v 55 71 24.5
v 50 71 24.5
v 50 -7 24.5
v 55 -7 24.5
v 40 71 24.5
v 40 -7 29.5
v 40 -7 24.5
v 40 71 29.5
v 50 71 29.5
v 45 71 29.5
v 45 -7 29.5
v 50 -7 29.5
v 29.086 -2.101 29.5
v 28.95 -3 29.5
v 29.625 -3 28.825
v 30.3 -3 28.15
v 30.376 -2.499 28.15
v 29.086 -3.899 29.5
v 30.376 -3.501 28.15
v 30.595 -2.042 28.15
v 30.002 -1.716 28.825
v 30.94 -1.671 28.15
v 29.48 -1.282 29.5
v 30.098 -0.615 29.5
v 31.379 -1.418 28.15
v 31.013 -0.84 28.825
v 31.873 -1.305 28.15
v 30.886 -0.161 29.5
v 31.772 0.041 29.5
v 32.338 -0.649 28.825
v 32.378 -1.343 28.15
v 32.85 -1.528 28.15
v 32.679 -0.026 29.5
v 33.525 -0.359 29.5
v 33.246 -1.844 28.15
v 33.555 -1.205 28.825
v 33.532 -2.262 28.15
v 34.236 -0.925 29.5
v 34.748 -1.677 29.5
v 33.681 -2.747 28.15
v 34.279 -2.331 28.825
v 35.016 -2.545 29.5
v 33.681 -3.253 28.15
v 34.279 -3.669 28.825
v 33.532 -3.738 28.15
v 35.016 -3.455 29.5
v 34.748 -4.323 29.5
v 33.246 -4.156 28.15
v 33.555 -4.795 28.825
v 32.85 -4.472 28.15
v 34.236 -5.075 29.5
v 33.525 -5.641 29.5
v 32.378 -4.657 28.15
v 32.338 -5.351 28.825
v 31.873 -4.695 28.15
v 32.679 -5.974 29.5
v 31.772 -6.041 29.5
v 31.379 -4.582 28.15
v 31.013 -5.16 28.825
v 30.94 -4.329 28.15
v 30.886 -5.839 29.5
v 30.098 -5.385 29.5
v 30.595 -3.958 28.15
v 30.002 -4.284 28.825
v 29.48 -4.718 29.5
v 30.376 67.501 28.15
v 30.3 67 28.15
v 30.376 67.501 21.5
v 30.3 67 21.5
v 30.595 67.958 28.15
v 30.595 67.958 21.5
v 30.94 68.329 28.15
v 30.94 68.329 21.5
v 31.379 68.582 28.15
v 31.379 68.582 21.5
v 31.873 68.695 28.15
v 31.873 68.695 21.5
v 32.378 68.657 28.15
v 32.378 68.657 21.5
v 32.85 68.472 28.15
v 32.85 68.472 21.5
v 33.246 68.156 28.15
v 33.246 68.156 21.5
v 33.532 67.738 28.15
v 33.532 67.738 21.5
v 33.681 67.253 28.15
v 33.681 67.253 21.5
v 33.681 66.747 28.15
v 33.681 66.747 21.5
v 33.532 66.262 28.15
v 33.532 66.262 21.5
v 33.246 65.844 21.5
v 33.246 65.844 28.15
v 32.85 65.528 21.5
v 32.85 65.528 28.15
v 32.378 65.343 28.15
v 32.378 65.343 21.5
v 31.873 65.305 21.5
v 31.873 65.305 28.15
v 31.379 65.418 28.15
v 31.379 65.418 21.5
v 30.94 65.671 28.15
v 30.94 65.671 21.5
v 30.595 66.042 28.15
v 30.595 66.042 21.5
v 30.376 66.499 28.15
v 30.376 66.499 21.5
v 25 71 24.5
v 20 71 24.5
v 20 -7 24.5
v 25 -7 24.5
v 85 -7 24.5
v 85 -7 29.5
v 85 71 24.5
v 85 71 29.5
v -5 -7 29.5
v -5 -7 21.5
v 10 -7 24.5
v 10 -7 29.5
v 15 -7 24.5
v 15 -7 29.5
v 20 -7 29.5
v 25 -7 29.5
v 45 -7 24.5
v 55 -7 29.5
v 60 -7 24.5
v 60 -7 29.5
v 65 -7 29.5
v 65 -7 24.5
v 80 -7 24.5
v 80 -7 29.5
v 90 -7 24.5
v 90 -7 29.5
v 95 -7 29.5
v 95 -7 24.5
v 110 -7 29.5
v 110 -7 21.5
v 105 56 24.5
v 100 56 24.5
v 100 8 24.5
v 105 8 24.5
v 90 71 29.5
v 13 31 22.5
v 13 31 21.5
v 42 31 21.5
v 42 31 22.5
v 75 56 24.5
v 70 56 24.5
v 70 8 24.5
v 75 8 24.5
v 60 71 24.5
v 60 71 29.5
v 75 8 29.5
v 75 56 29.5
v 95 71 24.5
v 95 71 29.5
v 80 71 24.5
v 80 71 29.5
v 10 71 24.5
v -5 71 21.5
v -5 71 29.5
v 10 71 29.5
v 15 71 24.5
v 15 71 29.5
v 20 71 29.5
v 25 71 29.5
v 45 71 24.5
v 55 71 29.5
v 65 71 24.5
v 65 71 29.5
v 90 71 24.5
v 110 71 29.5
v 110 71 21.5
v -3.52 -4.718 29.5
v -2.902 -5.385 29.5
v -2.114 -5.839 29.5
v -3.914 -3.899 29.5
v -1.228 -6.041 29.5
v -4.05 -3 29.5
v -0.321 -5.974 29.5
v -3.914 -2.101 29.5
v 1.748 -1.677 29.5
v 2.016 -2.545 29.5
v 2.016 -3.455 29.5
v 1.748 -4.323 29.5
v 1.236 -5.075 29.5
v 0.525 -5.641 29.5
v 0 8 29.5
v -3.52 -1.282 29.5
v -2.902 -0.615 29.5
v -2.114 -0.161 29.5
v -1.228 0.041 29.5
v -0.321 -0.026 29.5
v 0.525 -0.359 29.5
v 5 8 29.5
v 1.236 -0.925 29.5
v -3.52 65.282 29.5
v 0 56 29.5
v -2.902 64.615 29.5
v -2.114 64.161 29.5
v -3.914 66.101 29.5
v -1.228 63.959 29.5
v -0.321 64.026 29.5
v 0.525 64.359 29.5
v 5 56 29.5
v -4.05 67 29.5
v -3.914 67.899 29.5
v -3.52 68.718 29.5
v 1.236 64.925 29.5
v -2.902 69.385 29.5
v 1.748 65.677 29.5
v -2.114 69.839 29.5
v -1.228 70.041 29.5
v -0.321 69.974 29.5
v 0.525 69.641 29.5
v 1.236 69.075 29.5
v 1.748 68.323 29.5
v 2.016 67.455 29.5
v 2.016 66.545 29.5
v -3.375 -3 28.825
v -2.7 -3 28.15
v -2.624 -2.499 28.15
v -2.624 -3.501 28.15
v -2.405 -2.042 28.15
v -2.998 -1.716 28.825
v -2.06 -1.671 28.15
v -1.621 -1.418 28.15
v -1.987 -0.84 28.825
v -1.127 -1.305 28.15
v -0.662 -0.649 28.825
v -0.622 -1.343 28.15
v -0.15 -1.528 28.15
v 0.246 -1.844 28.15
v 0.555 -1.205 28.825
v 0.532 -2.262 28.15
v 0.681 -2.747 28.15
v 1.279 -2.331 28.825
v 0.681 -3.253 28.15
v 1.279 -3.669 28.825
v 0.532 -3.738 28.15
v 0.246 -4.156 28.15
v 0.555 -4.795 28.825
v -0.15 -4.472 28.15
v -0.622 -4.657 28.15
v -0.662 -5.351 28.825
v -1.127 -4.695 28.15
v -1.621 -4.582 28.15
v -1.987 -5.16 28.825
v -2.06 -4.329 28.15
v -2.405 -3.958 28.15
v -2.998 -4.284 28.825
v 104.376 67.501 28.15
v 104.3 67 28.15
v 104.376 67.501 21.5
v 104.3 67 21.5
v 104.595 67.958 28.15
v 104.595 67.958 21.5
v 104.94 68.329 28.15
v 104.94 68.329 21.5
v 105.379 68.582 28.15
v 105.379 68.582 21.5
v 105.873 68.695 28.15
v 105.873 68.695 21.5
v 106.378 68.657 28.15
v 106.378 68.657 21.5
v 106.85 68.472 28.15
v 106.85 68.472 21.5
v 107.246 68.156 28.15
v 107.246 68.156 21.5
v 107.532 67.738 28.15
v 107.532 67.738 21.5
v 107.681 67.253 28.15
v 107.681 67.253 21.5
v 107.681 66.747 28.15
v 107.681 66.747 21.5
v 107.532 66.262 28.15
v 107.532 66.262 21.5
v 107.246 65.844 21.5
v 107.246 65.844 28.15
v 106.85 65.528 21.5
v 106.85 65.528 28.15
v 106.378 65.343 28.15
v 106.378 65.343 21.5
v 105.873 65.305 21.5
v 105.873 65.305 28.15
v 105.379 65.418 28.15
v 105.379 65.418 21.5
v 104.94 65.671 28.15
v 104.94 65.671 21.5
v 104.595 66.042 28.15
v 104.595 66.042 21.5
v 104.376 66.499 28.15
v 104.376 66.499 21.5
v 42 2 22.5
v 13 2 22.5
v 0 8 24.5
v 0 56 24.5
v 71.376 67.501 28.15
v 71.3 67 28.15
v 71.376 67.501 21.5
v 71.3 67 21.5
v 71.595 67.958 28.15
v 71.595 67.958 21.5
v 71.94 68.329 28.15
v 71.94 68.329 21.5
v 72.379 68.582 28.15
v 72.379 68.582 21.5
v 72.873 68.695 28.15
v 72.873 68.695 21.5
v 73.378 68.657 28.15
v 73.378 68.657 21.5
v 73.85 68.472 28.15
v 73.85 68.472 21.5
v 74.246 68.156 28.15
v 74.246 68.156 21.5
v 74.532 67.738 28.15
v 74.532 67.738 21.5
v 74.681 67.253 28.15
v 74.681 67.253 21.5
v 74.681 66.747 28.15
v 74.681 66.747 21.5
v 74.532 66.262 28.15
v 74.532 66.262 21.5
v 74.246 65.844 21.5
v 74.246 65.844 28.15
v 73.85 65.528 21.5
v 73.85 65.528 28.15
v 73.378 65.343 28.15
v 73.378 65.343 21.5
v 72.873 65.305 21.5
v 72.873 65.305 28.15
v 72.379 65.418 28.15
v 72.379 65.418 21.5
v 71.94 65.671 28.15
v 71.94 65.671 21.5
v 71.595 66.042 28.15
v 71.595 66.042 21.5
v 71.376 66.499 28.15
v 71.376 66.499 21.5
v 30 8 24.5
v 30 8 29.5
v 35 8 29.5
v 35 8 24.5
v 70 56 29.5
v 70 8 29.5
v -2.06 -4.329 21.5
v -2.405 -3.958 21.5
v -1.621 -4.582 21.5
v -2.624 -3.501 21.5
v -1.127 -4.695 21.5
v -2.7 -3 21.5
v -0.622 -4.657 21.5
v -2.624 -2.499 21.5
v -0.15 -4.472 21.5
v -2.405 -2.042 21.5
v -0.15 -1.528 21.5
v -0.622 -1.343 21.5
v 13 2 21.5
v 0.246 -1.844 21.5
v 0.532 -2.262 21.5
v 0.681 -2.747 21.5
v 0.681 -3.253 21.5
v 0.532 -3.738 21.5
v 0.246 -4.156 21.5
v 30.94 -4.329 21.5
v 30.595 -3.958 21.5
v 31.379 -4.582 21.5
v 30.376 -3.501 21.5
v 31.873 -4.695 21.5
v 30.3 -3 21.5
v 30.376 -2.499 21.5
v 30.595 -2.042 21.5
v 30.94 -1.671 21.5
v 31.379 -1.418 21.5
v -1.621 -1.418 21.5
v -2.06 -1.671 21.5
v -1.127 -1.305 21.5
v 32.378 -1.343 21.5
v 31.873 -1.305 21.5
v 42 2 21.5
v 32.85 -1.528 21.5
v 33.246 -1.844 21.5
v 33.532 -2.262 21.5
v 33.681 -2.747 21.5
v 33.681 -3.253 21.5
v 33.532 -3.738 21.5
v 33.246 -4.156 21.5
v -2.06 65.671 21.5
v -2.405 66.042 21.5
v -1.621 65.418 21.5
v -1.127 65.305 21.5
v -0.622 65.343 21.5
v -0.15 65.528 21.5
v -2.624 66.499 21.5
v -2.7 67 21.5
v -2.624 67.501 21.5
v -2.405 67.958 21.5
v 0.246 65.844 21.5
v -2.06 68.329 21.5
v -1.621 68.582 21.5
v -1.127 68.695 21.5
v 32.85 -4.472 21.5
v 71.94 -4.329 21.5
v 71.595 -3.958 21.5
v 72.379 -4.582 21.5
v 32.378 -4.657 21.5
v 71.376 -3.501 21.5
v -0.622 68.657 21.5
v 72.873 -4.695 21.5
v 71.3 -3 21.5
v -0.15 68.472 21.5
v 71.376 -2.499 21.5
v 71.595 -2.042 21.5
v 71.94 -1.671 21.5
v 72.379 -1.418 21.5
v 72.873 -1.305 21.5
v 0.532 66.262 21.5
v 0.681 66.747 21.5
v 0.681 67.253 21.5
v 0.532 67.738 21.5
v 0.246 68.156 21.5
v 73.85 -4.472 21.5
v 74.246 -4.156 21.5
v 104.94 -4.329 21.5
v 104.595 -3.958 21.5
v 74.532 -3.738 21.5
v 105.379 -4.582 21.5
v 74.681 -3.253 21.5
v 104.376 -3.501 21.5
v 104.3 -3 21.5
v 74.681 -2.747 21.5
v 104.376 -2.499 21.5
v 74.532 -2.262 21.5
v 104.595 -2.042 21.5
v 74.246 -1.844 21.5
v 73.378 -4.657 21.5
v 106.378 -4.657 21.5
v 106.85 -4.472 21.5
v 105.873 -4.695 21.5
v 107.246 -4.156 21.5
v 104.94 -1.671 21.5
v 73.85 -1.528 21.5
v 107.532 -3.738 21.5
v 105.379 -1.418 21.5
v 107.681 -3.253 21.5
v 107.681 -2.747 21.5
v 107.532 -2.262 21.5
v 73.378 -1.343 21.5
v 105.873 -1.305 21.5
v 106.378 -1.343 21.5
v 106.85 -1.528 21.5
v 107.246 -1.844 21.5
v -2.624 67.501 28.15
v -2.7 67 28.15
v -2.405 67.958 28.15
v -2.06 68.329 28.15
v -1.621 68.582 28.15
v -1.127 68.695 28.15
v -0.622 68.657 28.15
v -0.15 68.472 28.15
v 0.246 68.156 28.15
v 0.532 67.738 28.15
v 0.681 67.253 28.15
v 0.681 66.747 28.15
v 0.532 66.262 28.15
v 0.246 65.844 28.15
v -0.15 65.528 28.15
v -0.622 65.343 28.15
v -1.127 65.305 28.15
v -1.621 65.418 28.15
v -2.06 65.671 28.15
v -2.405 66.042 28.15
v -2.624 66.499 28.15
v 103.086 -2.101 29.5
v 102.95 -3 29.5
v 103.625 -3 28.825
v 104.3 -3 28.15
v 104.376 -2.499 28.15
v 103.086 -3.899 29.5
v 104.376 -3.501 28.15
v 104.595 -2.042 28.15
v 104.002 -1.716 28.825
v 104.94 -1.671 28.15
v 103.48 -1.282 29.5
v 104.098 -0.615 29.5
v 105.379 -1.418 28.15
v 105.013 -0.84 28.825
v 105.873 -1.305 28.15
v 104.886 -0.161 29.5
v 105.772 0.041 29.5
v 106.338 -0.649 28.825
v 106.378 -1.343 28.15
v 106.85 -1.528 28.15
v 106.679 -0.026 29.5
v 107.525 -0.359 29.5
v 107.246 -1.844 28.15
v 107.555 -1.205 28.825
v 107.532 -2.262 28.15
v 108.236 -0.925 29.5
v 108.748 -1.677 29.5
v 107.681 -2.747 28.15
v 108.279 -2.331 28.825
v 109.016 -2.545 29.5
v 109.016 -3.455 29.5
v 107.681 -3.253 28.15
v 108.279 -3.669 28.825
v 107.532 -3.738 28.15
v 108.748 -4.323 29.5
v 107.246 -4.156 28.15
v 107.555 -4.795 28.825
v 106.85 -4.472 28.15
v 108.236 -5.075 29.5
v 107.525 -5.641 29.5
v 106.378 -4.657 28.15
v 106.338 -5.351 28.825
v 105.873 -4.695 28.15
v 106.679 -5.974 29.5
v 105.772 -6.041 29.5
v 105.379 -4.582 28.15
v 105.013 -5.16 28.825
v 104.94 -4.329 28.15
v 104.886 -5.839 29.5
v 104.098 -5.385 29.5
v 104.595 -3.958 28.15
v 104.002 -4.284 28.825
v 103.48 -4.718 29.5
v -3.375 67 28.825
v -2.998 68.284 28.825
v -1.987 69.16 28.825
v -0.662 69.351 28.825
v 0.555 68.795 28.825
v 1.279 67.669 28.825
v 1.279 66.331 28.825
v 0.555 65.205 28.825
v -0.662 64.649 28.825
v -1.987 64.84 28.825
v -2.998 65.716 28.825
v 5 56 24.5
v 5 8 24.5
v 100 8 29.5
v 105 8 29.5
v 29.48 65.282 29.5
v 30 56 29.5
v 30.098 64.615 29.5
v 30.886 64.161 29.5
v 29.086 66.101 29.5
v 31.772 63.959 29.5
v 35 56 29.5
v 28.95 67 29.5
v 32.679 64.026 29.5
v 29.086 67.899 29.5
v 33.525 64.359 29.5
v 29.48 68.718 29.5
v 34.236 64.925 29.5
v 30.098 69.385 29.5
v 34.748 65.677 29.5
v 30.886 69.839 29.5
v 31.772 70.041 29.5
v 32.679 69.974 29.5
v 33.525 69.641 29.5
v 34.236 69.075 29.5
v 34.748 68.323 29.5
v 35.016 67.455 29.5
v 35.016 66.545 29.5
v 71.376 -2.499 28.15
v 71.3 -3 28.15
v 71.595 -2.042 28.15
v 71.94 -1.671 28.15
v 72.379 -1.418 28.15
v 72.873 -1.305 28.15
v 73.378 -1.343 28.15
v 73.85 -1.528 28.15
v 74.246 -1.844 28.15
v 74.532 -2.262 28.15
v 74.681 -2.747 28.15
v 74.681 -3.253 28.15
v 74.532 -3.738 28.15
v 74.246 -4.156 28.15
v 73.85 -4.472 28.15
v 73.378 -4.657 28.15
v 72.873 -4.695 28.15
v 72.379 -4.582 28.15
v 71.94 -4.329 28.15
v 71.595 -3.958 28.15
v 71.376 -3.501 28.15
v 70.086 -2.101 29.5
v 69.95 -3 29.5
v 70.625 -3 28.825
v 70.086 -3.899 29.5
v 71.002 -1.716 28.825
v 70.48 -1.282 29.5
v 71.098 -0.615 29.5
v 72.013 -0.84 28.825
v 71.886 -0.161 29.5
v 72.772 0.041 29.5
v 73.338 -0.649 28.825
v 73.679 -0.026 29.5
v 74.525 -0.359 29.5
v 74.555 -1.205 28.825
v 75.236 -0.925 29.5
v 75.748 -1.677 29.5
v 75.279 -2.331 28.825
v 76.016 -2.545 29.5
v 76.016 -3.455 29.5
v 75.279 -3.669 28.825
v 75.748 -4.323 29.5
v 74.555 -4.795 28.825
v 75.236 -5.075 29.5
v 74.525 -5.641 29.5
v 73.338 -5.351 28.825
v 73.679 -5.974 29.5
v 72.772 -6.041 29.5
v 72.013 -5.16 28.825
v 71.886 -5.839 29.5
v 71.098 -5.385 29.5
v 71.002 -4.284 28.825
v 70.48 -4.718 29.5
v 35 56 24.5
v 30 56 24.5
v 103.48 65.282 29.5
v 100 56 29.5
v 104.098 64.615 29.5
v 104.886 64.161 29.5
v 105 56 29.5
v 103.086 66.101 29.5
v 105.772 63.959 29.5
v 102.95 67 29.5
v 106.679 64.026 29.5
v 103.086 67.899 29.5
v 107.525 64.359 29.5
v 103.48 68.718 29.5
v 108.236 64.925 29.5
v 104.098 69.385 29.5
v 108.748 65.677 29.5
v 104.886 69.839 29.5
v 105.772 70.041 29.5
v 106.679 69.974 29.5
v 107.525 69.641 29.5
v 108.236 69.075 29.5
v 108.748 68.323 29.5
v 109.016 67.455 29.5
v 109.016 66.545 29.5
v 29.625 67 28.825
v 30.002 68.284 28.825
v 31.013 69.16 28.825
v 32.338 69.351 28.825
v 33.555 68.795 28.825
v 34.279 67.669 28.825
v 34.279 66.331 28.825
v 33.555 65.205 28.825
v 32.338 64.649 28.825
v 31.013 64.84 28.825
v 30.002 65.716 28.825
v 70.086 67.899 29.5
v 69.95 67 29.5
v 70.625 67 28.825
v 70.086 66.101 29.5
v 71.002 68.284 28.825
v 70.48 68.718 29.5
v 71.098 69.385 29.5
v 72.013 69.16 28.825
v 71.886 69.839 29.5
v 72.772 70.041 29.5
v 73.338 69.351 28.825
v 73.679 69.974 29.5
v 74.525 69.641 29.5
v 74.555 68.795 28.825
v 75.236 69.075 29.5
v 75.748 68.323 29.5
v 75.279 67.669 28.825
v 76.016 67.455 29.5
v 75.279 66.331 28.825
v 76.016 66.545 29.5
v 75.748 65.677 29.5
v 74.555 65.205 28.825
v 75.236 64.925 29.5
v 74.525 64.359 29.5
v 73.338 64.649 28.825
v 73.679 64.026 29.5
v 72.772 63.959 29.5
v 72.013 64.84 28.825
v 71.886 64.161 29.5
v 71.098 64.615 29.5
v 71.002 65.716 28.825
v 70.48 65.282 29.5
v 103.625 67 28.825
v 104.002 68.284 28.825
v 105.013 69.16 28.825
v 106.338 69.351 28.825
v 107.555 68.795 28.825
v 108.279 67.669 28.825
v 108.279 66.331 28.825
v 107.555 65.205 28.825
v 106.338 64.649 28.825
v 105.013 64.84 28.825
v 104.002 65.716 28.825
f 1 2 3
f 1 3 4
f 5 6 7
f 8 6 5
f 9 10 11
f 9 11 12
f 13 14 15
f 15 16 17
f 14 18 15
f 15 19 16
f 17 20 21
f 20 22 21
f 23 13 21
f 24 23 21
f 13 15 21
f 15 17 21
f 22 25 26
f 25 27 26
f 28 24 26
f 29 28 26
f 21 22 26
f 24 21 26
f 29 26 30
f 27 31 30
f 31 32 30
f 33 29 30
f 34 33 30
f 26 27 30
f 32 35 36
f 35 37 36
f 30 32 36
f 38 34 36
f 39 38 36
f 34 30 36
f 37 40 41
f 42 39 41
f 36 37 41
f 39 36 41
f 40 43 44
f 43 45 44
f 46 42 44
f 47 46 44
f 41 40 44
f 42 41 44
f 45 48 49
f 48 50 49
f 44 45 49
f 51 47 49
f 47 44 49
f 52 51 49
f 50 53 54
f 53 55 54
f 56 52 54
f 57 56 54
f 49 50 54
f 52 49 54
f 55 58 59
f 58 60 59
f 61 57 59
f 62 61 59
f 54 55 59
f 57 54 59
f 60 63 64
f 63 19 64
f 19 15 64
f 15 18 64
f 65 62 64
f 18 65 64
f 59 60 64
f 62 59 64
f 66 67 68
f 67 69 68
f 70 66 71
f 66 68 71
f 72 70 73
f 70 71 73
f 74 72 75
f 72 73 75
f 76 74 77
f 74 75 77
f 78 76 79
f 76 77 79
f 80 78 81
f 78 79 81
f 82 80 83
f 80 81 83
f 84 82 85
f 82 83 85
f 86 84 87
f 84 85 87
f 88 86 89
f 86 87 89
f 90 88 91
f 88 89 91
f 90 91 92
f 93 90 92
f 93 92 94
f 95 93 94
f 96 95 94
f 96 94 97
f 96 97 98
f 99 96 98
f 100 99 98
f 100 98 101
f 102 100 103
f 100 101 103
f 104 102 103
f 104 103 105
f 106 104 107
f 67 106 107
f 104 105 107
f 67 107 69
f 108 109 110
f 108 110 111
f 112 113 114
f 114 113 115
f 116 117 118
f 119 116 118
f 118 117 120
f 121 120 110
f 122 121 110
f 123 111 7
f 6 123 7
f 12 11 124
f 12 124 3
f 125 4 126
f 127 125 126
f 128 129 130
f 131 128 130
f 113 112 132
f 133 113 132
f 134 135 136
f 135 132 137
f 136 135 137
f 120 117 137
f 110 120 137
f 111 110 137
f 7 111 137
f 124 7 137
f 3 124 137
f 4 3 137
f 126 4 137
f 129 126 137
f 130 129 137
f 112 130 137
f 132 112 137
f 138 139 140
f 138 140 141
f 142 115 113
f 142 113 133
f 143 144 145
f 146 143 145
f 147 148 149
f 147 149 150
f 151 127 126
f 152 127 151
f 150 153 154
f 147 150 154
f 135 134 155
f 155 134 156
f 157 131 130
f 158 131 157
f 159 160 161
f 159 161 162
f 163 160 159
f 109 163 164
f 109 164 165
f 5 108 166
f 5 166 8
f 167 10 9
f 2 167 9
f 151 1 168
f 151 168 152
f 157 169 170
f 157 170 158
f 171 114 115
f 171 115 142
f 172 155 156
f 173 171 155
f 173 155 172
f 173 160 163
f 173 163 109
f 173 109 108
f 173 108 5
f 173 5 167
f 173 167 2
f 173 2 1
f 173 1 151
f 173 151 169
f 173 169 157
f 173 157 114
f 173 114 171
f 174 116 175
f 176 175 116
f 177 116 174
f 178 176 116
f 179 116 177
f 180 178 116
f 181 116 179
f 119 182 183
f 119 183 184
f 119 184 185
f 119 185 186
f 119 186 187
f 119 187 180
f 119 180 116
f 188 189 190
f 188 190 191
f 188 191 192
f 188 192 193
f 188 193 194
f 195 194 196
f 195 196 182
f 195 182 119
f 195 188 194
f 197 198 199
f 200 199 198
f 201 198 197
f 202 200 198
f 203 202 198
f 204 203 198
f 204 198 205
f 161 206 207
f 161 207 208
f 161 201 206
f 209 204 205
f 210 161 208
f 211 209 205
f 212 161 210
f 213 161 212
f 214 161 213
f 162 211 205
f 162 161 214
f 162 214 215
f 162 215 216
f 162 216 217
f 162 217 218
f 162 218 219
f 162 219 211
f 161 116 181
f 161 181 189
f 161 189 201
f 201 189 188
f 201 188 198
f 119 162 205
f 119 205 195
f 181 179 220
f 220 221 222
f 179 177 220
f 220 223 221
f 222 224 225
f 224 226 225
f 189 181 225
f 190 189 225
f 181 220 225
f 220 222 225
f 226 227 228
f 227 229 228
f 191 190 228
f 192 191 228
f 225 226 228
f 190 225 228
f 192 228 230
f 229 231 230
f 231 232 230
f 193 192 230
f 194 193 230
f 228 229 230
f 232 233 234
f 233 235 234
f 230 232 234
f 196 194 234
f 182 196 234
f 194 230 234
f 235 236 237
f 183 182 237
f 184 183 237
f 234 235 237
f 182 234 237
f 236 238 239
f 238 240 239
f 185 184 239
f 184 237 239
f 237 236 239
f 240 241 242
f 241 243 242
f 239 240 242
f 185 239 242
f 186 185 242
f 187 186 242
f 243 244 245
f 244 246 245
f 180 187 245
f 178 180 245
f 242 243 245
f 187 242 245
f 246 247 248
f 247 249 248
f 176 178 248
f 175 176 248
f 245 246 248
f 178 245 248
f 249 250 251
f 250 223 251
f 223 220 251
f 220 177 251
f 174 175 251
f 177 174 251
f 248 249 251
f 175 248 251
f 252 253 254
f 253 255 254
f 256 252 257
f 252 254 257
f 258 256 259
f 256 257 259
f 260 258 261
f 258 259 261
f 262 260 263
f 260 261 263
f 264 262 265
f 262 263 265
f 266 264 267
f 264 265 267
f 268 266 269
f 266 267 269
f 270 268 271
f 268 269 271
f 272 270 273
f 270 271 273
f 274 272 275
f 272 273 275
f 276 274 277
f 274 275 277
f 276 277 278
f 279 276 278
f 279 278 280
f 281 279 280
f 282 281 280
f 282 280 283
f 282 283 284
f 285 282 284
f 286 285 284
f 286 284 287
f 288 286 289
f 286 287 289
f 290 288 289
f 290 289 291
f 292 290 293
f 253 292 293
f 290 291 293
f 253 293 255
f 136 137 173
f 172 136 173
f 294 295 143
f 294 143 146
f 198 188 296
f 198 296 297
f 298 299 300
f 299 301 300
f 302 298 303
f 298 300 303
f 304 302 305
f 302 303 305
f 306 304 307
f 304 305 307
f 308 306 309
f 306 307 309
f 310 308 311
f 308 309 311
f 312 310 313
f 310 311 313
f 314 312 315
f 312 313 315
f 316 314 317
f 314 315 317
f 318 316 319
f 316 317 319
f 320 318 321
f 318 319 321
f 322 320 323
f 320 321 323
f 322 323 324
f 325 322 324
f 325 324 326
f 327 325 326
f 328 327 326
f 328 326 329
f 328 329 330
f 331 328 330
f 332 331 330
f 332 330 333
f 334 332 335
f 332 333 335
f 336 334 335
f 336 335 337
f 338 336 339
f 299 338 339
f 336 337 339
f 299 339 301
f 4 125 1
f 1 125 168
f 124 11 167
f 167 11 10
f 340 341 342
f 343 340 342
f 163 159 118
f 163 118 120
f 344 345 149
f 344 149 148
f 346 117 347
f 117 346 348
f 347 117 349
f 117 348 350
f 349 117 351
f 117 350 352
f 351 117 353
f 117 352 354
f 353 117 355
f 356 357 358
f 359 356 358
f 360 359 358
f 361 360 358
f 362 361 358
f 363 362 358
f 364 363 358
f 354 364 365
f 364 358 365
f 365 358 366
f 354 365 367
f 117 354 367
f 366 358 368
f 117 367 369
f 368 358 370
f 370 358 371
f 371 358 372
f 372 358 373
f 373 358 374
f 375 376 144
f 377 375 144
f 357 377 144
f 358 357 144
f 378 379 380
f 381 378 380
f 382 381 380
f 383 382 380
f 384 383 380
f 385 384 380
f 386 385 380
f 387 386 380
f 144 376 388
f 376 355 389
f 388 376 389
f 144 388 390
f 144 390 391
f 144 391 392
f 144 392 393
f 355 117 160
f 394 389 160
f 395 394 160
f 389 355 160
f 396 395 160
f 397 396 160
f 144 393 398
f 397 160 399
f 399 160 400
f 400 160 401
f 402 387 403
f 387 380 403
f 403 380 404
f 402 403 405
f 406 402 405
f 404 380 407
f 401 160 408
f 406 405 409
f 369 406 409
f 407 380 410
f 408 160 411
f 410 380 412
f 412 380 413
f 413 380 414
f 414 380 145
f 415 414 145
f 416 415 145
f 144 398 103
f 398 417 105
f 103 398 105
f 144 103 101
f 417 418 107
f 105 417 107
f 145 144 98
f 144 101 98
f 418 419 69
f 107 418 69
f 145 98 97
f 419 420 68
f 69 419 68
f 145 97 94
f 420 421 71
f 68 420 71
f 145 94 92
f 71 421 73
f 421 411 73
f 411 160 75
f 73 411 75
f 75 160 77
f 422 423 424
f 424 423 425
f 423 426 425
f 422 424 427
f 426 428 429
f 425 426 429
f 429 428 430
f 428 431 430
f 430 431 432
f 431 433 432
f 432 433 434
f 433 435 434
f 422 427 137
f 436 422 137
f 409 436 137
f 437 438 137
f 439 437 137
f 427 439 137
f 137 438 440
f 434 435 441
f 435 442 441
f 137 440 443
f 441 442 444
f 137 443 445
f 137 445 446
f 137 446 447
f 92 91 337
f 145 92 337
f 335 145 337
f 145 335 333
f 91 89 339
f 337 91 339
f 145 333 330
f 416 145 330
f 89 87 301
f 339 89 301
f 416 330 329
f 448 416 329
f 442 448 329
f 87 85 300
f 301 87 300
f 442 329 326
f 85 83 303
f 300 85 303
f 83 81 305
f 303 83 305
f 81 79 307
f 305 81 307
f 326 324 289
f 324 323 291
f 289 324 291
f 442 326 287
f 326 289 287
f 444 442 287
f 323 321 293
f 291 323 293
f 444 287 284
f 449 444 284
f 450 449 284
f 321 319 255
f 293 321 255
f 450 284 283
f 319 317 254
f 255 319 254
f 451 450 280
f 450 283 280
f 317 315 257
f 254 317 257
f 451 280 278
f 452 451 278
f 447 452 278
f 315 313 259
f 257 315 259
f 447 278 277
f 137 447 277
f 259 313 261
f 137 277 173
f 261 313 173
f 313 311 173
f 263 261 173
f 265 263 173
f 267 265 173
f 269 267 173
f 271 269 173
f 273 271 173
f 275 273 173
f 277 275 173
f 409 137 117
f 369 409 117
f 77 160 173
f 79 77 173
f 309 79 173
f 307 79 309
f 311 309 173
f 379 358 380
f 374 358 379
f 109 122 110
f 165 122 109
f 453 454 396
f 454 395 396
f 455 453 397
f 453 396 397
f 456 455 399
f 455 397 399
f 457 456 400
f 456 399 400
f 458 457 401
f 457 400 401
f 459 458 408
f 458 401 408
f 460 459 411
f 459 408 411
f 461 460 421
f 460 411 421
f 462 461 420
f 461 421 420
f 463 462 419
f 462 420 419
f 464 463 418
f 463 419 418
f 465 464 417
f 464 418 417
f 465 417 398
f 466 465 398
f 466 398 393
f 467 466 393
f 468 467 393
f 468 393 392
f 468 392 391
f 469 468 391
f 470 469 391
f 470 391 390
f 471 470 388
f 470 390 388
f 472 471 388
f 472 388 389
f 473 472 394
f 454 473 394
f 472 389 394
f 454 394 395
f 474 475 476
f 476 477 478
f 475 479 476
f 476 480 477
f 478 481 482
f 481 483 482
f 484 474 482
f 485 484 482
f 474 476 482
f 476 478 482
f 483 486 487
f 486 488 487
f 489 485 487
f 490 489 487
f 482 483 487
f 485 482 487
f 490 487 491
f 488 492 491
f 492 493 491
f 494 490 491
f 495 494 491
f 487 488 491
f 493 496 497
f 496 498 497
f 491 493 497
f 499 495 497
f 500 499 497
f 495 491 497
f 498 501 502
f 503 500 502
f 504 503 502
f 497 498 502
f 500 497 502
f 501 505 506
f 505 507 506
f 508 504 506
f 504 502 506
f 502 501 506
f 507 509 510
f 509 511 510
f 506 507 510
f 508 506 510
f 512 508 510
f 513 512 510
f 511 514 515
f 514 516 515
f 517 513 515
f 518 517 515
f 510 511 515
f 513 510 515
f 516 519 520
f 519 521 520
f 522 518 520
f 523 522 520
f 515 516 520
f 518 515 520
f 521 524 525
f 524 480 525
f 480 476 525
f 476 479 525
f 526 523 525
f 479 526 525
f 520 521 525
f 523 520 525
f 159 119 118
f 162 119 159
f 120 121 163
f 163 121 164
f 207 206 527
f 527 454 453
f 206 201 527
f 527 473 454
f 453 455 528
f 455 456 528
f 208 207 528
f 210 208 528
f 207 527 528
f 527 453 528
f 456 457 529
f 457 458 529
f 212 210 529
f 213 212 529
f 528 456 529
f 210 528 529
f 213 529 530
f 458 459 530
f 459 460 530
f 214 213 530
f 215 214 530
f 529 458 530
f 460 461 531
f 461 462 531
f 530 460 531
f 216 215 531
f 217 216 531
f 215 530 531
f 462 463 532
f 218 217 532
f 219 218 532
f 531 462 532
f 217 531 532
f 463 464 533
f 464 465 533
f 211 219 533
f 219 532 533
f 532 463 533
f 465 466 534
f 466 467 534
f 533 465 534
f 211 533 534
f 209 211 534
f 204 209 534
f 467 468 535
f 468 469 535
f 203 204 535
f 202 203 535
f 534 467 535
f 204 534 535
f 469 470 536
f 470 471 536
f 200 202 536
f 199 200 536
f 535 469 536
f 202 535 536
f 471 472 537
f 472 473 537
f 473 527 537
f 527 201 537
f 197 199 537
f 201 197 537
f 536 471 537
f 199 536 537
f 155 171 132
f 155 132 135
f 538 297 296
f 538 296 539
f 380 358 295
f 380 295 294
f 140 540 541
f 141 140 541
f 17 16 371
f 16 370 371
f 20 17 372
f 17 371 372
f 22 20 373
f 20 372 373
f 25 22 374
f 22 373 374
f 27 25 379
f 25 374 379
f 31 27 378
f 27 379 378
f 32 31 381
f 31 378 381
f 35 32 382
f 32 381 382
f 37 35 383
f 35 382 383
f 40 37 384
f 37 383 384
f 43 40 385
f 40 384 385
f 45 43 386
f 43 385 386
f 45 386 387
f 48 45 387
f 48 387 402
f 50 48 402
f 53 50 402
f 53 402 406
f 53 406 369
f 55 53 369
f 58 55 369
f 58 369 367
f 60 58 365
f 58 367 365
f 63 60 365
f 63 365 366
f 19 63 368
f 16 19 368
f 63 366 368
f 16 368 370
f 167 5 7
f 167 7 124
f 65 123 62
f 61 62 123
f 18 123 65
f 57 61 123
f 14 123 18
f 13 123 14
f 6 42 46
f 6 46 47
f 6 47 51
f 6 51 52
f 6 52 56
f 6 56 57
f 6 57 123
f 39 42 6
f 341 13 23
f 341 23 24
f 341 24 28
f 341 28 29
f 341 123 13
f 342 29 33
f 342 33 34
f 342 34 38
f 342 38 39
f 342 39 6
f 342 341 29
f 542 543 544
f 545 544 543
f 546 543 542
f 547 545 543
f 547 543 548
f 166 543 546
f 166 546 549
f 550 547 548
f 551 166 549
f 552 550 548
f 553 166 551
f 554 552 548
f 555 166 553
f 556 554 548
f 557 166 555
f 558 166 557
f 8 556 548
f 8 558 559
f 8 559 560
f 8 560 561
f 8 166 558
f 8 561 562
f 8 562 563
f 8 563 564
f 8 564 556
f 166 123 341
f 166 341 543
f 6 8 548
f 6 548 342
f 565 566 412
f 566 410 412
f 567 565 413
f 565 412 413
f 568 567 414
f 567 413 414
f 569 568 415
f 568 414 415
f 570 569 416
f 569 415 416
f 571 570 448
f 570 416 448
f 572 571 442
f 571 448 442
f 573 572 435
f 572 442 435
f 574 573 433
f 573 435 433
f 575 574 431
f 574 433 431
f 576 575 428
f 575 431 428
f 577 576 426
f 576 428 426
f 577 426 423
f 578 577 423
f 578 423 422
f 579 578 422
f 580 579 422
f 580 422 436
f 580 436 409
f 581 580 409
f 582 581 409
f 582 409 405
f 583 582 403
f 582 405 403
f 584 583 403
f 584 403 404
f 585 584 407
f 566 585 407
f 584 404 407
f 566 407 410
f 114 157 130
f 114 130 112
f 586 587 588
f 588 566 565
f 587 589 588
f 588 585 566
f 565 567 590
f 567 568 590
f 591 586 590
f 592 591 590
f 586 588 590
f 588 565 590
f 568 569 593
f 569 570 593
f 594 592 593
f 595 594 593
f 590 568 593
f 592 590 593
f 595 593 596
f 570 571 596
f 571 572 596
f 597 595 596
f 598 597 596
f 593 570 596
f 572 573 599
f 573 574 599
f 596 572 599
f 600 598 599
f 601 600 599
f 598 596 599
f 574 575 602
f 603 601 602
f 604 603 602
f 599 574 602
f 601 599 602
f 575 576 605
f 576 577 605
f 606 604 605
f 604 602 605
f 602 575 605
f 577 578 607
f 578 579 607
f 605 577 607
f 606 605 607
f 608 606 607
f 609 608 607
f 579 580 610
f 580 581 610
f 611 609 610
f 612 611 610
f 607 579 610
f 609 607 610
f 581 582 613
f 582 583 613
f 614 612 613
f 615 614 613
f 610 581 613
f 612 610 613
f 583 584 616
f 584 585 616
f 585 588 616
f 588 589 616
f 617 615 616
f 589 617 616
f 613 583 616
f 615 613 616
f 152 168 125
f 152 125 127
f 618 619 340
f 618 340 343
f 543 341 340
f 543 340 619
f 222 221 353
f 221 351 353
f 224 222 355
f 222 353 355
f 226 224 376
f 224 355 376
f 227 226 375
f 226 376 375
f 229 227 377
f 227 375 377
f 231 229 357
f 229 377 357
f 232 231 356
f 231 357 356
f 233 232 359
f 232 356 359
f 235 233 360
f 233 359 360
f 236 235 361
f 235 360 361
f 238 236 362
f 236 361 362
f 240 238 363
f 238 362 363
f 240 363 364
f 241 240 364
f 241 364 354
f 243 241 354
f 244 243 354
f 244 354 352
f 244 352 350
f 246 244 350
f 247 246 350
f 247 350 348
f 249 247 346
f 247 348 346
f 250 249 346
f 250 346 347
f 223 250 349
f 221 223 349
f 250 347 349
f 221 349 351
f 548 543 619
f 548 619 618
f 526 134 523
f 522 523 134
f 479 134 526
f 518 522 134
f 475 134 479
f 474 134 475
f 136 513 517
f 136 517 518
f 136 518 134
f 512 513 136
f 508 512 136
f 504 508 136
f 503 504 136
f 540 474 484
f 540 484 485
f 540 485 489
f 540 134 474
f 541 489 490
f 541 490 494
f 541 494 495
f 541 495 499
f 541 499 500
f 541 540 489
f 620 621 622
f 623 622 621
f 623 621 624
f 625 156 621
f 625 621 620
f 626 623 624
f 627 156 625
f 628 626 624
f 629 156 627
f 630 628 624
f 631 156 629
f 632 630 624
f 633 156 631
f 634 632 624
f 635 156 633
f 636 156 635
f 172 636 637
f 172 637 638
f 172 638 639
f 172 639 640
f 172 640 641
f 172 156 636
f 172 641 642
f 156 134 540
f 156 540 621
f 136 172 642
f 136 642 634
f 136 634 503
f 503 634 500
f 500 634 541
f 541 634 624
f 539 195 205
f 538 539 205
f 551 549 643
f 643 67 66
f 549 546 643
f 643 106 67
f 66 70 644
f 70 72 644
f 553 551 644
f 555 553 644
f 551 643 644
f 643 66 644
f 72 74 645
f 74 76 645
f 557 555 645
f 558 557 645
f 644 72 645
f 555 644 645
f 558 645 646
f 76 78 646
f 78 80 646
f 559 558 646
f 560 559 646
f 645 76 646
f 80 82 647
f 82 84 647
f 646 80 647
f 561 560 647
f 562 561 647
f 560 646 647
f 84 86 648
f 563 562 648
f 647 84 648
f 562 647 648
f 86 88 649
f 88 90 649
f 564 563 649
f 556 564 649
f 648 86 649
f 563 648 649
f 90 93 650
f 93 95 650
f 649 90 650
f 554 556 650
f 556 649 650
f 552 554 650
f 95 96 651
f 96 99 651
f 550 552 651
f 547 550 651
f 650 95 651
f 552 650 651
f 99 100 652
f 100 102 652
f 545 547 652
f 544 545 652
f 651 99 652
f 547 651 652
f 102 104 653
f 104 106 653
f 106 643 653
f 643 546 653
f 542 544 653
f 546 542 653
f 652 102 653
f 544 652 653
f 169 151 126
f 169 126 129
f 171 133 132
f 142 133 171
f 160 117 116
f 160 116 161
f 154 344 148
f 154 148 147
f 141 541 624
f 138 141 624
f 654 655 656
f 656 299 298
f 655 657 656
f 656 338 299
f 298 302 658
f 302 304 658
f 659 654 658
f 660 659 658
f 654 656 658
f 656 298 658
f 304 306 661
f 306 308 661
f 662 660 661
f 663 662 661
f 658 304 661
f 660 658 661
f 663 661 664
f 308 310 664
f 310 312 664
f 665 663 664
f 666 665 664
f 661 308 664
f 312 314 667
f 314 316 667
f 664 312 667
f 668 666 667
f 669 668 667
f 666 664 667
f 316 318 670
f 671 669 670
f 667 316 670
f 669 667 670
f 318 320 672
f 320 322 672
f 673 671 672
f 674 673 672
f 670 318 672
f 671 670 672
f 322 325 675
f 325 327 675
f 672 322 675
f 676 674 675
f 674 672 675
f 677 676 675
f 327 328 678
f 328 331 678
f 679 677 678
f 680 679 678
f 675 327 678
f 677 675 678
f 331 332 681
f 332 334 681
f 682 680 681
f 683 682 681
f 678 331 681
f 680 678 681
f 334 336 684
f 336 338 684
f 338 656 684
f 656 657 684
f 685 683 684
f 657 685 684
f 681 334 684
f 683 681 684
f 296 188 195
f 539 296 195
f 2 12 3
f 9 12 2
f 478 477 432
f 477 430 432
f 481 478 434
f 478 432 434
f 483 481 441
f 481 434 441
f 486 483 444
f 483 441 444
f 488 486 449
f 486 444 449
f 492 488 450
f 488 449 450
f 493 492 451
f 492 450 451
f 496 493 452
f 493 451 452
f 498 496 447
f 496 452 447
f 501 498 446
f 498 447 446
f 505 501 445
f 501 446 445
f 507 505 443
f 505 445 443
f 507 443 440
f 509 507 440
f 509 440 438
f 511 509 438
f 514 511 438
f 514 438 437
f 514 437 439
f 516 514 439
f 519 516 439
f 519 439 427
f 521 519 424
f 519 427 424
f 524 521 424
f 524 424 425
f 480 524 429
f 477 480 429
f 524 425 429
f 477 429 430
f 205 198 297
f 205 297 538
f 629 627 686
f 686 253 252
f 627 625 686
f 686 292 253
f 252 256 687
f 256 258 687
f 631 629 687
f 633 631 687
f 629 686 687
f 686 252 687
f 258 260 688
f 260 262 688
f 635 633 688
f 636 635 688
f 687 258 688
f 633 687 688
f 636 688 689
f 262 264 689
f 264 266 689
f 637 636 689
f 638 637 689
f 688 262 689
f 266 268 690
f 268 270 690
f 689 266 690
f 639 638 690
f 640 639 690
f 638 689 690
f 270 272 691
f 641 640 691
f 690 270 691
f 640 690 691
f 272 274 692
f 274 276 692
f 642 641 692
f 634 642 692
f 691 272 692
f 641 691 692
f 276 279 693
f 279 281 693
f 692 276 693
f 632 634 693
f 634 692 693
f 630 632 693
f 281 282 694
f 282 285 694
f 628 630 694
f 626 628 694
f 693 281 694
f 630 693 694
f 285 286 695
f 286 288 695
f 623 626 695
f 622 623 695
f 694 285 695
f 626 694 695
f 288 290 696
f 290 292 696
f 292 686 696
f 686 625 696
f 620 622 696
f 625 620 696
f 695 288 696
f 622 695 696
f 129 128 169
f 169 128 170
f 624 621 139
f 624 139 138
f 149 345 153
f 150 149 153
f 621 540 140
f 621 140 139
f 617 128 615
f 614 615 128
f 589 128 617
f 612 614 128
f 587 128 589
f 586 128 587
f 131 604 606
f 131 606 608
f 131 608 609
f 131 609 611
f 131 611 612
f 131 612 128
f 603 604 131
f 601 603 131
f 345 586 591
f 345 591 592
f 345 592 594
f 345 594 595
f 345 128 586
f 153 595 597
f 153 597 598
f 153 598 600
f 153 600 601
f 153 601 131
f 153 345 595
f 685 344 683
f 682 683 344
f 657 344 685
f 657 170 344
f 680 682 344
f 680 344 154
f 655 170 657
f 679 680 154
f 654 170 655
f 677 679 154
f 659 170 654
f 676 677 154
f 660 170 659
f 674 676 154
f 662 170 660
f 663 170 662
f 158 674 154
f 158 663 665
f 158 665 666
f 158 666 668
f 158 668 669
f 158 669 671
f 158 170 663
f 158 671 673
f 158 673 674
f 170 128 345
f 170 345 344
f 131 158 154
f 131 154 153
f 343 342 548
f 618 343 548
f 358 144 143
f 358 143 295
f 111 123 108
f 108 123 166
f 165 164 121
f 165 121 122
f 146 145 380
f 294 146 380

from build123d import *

# Parameters (mm, degrees)
SKETCH022_W         = 115
SKETCH022_H         = 78
PAD010_DEPTH        = 8
HOLE002_D           = 3.4
HOLE002_DEPTH       = 8
HOLE002_CSINK_D     = 6.1
HOLE002_CSINK_ANGLE = 90
HOLE002_TIPS_R      = 1.7
SKETCH027_W         = 29
SKETCH027_H         = 29
POCKET009_DEPTH     = 1
SKETCH032_W         = 5
SKETCH032_H         = 48
SKETCH032_H_2       = 78
POCKET012_DEPTH     = 5


with BuildPart() as part:
    # Sketch022 (on Face1 of CopyPad011) → Pad010 (new body)
    with BuildSketch(Plane.XY.offset(24)):
        with Locations((52.5, 32)):
            Rectangle(SKETCH022_W, SKETCH022_H)
    extrude(amount=PAD010_DEPTH)

    # Hole002
    with Locations(Plane.XY.offset(32)):
        with Locations((-1, 67), (106, 67), (106, -3), (-1, -3), (32, 67), (73, -3), (32, -3), (73, 67)):
            CounterSinkHole(HOLE002_D / 2, HOLE002_CSINK_D / 2, depth=HOLE002_DEPTH, counter_sink_angle=HOLE002_CSINK_ANGLE)

    # Hole002 tips → Hole002 tip 1 section 0
    with BuildSketch(Plane.XY.offset(24), mode=Mode.PRIVATE) as hole002_tip_1_s0:
        with Locations((-1, 67)):
            Circle(HOLE002_TIPS_R)
    loft([hole002_tip_1_s0.sketch, Vertex(-1, 67, 22.978537)], mode=Mode.SUBTRACT)

    # Hole002 tips → Hole002 tip 2 section 0
    with BuildSketch(Plane.XY.offset(24), mode=Mode.PRIVATE) as hole002_tip_2_s0:
        with Locations((106, 67)):
            Circle(HOLE002_TIPS_R)
    loft([hole002_tip_2_s0.sketch, Vertex(106, 67, 22.978537)], mode=Mode.SUBTRACT)

    # Hole002 tips → Hole002 tip 3 section 0
    with BuildSketch(Plane.XY.offset(24), mode=Mode.PRIVATE) as hole002_tip_3_s0:
        with Locations((106, -3)):
            Circle(HOLE002_TIPS_R)
    loft([hole002_tip_3_s0.sketch, Vertex(106, -3, 22.978537)], mode=Mode.SUBTRACT)

    # Hole002 tips → Hole002 tip 4 section 0
    with BuildSketch(Plane.XY.offset(24), mode=Mode.PRIVATE) as hole002_tip_4_s0:
        with Locations((-1, -3)):
            Circle(HOLE002_TIPS_R)
    loft([hole002_tip_4_s0.sketch, Vertex(-1, -3, 22.978537)], mode=Mode.SUBTRACT)

    # Hole002 tips → Hole002 tip 5 section 0
    with BuildSketch(Plane.XY.offset(24), mode=Mode.PRIVATE) as hole002_tip_5_s0:
        with Locations((32, 67)):
            Circle(HOLE002_TIPS_R)
    loft([hole002_tip_5_s0.sketch, Vertex(32, 67, 22.978537)], mode=Mode.SUBTRACT)

    # Hole002 tips → Hole002 tip 6 section 0
    with BuildSketch(Plane.XY.offset(24), mode=Mode.PRIVATE) as hole002_tip_6_s0:
        with Locations((73, -3)):
            Circle(HOLE002_TIPS_R)
    loft([hole002_tip_6_s0.sketch, Vertex(73, -3, 22.978537)], mode=Mode.SUBTRACT)

    # Hole002 tips → Hole002 tip 7 section 0
    with BuildSketch(Plane.XY.offset(24), mode=Mode.PRIVATE) as hole002_tip_7_s0:
        with Locations((32, -3)):
            Circle(HOLE002_TIPS_R)
    loft([hole002_tip_7_s0.sketch, Vertex(32, -3, 22.978537)], mode=Mode.SUBTRACT)

    # Hole002 tips → Hole002 tip 8 section 0
    with BuildSketch(Plane.XY.offset(24), mode=Mode.PRIVATE) as hole002_tip_8_s0:
        with Locations((73, 67)):
            Circle(HOLE002_TIPS_R)
    loft([hole002_tip_8_s0.sketch, Vertex(73, 67, 22.978537)], mode=Mode.SUBTRACT)

    # Sketch027 → Pocket009 (cut)
    with BuildSketch(Plane(origin=(0, 0, 24), x_dir=(1, 0, 0), z_dir=(0, 0, -1))):
        with Locations((27.5, -16.5)):
            Rectangle(SKETCH027_W, SKETCH027_H)
    extrude(amount=-POCKET009_DEPTH, mode=Mode.SUBTRACT)

    # Sketch032 (on Face5 of Pocket009) → Pocket012 (cut)
    with BuildSketch(Plane.XY.offset(32)):
        with Locations((2.5, 32)):
            Rectangle(SKETCH032_W, SKETCH032_H)
        with Locations((12.5, 32)):
            Rectangle(SKETCH032_W, SKETCH032_H_2)
        with Locations((22.5, 32)):
            Rectangle(SKETCH032_W, SKETCH032_H_2)
        with Locations((32.5, 32)):
            Rectangle(SKETCH032_W, SKETCH032_H)
        with Locations((42.5, 32)):
            Rectangle(SKETCH032_W, SKETCH032_H_2)
        with Locations((52.5, 32)):
            Rectangle(SKETCH032_W, SKETCH032_H_2)
        with Locations((62.5, 32)):
            Rectangle(SKETCH032_W, SKETCH032_H_2)
        with Locations((72.5, 32)):
            Rectangle(SKETCH032_W, SKETCH032_H)
        with Locations((82.5, 32)):
            Rectangle(SKETCH032_W, SKETCH032_H_2)
        with Locations((92.5, 32)):
            Rectangle(SKETCH032_W, SKETCH032_H_2)
        with Locations((102.5, 32)):
            Rectangle(SKETCH032_W, SKETCH032_H)
    extrude(amount=-POCKET012_DEPTH, mode=Mode.SUBTRACT)


with BuildPart() as part_1:
    # Body002 placement: moved
    add(part.part.moved(Location((0, 0, -2.5))))


solid = part_1.part
